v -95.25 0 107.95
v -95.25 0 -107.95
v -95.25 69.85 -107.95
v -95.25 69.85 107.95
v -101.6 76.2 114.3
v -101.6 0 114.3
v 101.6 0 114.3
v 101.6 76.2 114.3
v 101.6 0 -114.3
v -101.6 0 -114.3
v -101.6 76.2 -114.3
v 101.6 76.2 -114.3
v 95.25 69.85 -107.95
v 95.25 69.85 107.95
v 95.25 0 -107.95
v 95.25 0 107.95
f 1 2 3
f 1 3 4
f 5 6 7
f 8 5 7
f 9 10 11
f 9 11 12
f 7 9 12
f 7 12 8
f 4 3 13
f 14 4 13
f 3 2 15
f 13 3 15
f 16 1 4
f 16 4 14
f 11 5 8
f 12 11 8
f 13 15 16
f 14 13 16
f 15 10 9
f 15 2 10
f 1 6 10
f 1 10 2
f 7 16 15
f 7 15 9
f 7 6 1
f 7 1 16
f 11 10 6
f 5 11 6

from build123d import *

# Parameters (mm, degrees)
F0_W     = 203.2
F0_H     = 228.6
F0_W_2   = 190.5
F0_H_2   = 215.9
F1_DEPTH = 76.2
F2_DEPTH = 76.2
F3_DEPTH = 69.85


with BuildPart() as f1:
    # F0 (on Front) → F1 (new body)
    with BuildSketch(Plane.XZ):
        Rectangle(F0_W, F0_H)
        Rectangle(F0_W_2, F0_H_2, mode=Mode.SUBTRACT)
    extrude(amount=-F1_DEPTH)

    # F0 (on Front) → F2 (join)
    with BuildSketch(Plane.XZ):
        Rectangle(F0_W_2, F0_H_2)
    extrude(amount=-F2_DEPTH)

    # F0 (on Front) → F3 (cut)
    with BuildSketch(Plane.XZ):
        Rectangle(F0_W_2, F0_H_2)
    extrude(amount=-F3_DEPTH, mode=Mode.SUBTRACT)


solid = f1.part
